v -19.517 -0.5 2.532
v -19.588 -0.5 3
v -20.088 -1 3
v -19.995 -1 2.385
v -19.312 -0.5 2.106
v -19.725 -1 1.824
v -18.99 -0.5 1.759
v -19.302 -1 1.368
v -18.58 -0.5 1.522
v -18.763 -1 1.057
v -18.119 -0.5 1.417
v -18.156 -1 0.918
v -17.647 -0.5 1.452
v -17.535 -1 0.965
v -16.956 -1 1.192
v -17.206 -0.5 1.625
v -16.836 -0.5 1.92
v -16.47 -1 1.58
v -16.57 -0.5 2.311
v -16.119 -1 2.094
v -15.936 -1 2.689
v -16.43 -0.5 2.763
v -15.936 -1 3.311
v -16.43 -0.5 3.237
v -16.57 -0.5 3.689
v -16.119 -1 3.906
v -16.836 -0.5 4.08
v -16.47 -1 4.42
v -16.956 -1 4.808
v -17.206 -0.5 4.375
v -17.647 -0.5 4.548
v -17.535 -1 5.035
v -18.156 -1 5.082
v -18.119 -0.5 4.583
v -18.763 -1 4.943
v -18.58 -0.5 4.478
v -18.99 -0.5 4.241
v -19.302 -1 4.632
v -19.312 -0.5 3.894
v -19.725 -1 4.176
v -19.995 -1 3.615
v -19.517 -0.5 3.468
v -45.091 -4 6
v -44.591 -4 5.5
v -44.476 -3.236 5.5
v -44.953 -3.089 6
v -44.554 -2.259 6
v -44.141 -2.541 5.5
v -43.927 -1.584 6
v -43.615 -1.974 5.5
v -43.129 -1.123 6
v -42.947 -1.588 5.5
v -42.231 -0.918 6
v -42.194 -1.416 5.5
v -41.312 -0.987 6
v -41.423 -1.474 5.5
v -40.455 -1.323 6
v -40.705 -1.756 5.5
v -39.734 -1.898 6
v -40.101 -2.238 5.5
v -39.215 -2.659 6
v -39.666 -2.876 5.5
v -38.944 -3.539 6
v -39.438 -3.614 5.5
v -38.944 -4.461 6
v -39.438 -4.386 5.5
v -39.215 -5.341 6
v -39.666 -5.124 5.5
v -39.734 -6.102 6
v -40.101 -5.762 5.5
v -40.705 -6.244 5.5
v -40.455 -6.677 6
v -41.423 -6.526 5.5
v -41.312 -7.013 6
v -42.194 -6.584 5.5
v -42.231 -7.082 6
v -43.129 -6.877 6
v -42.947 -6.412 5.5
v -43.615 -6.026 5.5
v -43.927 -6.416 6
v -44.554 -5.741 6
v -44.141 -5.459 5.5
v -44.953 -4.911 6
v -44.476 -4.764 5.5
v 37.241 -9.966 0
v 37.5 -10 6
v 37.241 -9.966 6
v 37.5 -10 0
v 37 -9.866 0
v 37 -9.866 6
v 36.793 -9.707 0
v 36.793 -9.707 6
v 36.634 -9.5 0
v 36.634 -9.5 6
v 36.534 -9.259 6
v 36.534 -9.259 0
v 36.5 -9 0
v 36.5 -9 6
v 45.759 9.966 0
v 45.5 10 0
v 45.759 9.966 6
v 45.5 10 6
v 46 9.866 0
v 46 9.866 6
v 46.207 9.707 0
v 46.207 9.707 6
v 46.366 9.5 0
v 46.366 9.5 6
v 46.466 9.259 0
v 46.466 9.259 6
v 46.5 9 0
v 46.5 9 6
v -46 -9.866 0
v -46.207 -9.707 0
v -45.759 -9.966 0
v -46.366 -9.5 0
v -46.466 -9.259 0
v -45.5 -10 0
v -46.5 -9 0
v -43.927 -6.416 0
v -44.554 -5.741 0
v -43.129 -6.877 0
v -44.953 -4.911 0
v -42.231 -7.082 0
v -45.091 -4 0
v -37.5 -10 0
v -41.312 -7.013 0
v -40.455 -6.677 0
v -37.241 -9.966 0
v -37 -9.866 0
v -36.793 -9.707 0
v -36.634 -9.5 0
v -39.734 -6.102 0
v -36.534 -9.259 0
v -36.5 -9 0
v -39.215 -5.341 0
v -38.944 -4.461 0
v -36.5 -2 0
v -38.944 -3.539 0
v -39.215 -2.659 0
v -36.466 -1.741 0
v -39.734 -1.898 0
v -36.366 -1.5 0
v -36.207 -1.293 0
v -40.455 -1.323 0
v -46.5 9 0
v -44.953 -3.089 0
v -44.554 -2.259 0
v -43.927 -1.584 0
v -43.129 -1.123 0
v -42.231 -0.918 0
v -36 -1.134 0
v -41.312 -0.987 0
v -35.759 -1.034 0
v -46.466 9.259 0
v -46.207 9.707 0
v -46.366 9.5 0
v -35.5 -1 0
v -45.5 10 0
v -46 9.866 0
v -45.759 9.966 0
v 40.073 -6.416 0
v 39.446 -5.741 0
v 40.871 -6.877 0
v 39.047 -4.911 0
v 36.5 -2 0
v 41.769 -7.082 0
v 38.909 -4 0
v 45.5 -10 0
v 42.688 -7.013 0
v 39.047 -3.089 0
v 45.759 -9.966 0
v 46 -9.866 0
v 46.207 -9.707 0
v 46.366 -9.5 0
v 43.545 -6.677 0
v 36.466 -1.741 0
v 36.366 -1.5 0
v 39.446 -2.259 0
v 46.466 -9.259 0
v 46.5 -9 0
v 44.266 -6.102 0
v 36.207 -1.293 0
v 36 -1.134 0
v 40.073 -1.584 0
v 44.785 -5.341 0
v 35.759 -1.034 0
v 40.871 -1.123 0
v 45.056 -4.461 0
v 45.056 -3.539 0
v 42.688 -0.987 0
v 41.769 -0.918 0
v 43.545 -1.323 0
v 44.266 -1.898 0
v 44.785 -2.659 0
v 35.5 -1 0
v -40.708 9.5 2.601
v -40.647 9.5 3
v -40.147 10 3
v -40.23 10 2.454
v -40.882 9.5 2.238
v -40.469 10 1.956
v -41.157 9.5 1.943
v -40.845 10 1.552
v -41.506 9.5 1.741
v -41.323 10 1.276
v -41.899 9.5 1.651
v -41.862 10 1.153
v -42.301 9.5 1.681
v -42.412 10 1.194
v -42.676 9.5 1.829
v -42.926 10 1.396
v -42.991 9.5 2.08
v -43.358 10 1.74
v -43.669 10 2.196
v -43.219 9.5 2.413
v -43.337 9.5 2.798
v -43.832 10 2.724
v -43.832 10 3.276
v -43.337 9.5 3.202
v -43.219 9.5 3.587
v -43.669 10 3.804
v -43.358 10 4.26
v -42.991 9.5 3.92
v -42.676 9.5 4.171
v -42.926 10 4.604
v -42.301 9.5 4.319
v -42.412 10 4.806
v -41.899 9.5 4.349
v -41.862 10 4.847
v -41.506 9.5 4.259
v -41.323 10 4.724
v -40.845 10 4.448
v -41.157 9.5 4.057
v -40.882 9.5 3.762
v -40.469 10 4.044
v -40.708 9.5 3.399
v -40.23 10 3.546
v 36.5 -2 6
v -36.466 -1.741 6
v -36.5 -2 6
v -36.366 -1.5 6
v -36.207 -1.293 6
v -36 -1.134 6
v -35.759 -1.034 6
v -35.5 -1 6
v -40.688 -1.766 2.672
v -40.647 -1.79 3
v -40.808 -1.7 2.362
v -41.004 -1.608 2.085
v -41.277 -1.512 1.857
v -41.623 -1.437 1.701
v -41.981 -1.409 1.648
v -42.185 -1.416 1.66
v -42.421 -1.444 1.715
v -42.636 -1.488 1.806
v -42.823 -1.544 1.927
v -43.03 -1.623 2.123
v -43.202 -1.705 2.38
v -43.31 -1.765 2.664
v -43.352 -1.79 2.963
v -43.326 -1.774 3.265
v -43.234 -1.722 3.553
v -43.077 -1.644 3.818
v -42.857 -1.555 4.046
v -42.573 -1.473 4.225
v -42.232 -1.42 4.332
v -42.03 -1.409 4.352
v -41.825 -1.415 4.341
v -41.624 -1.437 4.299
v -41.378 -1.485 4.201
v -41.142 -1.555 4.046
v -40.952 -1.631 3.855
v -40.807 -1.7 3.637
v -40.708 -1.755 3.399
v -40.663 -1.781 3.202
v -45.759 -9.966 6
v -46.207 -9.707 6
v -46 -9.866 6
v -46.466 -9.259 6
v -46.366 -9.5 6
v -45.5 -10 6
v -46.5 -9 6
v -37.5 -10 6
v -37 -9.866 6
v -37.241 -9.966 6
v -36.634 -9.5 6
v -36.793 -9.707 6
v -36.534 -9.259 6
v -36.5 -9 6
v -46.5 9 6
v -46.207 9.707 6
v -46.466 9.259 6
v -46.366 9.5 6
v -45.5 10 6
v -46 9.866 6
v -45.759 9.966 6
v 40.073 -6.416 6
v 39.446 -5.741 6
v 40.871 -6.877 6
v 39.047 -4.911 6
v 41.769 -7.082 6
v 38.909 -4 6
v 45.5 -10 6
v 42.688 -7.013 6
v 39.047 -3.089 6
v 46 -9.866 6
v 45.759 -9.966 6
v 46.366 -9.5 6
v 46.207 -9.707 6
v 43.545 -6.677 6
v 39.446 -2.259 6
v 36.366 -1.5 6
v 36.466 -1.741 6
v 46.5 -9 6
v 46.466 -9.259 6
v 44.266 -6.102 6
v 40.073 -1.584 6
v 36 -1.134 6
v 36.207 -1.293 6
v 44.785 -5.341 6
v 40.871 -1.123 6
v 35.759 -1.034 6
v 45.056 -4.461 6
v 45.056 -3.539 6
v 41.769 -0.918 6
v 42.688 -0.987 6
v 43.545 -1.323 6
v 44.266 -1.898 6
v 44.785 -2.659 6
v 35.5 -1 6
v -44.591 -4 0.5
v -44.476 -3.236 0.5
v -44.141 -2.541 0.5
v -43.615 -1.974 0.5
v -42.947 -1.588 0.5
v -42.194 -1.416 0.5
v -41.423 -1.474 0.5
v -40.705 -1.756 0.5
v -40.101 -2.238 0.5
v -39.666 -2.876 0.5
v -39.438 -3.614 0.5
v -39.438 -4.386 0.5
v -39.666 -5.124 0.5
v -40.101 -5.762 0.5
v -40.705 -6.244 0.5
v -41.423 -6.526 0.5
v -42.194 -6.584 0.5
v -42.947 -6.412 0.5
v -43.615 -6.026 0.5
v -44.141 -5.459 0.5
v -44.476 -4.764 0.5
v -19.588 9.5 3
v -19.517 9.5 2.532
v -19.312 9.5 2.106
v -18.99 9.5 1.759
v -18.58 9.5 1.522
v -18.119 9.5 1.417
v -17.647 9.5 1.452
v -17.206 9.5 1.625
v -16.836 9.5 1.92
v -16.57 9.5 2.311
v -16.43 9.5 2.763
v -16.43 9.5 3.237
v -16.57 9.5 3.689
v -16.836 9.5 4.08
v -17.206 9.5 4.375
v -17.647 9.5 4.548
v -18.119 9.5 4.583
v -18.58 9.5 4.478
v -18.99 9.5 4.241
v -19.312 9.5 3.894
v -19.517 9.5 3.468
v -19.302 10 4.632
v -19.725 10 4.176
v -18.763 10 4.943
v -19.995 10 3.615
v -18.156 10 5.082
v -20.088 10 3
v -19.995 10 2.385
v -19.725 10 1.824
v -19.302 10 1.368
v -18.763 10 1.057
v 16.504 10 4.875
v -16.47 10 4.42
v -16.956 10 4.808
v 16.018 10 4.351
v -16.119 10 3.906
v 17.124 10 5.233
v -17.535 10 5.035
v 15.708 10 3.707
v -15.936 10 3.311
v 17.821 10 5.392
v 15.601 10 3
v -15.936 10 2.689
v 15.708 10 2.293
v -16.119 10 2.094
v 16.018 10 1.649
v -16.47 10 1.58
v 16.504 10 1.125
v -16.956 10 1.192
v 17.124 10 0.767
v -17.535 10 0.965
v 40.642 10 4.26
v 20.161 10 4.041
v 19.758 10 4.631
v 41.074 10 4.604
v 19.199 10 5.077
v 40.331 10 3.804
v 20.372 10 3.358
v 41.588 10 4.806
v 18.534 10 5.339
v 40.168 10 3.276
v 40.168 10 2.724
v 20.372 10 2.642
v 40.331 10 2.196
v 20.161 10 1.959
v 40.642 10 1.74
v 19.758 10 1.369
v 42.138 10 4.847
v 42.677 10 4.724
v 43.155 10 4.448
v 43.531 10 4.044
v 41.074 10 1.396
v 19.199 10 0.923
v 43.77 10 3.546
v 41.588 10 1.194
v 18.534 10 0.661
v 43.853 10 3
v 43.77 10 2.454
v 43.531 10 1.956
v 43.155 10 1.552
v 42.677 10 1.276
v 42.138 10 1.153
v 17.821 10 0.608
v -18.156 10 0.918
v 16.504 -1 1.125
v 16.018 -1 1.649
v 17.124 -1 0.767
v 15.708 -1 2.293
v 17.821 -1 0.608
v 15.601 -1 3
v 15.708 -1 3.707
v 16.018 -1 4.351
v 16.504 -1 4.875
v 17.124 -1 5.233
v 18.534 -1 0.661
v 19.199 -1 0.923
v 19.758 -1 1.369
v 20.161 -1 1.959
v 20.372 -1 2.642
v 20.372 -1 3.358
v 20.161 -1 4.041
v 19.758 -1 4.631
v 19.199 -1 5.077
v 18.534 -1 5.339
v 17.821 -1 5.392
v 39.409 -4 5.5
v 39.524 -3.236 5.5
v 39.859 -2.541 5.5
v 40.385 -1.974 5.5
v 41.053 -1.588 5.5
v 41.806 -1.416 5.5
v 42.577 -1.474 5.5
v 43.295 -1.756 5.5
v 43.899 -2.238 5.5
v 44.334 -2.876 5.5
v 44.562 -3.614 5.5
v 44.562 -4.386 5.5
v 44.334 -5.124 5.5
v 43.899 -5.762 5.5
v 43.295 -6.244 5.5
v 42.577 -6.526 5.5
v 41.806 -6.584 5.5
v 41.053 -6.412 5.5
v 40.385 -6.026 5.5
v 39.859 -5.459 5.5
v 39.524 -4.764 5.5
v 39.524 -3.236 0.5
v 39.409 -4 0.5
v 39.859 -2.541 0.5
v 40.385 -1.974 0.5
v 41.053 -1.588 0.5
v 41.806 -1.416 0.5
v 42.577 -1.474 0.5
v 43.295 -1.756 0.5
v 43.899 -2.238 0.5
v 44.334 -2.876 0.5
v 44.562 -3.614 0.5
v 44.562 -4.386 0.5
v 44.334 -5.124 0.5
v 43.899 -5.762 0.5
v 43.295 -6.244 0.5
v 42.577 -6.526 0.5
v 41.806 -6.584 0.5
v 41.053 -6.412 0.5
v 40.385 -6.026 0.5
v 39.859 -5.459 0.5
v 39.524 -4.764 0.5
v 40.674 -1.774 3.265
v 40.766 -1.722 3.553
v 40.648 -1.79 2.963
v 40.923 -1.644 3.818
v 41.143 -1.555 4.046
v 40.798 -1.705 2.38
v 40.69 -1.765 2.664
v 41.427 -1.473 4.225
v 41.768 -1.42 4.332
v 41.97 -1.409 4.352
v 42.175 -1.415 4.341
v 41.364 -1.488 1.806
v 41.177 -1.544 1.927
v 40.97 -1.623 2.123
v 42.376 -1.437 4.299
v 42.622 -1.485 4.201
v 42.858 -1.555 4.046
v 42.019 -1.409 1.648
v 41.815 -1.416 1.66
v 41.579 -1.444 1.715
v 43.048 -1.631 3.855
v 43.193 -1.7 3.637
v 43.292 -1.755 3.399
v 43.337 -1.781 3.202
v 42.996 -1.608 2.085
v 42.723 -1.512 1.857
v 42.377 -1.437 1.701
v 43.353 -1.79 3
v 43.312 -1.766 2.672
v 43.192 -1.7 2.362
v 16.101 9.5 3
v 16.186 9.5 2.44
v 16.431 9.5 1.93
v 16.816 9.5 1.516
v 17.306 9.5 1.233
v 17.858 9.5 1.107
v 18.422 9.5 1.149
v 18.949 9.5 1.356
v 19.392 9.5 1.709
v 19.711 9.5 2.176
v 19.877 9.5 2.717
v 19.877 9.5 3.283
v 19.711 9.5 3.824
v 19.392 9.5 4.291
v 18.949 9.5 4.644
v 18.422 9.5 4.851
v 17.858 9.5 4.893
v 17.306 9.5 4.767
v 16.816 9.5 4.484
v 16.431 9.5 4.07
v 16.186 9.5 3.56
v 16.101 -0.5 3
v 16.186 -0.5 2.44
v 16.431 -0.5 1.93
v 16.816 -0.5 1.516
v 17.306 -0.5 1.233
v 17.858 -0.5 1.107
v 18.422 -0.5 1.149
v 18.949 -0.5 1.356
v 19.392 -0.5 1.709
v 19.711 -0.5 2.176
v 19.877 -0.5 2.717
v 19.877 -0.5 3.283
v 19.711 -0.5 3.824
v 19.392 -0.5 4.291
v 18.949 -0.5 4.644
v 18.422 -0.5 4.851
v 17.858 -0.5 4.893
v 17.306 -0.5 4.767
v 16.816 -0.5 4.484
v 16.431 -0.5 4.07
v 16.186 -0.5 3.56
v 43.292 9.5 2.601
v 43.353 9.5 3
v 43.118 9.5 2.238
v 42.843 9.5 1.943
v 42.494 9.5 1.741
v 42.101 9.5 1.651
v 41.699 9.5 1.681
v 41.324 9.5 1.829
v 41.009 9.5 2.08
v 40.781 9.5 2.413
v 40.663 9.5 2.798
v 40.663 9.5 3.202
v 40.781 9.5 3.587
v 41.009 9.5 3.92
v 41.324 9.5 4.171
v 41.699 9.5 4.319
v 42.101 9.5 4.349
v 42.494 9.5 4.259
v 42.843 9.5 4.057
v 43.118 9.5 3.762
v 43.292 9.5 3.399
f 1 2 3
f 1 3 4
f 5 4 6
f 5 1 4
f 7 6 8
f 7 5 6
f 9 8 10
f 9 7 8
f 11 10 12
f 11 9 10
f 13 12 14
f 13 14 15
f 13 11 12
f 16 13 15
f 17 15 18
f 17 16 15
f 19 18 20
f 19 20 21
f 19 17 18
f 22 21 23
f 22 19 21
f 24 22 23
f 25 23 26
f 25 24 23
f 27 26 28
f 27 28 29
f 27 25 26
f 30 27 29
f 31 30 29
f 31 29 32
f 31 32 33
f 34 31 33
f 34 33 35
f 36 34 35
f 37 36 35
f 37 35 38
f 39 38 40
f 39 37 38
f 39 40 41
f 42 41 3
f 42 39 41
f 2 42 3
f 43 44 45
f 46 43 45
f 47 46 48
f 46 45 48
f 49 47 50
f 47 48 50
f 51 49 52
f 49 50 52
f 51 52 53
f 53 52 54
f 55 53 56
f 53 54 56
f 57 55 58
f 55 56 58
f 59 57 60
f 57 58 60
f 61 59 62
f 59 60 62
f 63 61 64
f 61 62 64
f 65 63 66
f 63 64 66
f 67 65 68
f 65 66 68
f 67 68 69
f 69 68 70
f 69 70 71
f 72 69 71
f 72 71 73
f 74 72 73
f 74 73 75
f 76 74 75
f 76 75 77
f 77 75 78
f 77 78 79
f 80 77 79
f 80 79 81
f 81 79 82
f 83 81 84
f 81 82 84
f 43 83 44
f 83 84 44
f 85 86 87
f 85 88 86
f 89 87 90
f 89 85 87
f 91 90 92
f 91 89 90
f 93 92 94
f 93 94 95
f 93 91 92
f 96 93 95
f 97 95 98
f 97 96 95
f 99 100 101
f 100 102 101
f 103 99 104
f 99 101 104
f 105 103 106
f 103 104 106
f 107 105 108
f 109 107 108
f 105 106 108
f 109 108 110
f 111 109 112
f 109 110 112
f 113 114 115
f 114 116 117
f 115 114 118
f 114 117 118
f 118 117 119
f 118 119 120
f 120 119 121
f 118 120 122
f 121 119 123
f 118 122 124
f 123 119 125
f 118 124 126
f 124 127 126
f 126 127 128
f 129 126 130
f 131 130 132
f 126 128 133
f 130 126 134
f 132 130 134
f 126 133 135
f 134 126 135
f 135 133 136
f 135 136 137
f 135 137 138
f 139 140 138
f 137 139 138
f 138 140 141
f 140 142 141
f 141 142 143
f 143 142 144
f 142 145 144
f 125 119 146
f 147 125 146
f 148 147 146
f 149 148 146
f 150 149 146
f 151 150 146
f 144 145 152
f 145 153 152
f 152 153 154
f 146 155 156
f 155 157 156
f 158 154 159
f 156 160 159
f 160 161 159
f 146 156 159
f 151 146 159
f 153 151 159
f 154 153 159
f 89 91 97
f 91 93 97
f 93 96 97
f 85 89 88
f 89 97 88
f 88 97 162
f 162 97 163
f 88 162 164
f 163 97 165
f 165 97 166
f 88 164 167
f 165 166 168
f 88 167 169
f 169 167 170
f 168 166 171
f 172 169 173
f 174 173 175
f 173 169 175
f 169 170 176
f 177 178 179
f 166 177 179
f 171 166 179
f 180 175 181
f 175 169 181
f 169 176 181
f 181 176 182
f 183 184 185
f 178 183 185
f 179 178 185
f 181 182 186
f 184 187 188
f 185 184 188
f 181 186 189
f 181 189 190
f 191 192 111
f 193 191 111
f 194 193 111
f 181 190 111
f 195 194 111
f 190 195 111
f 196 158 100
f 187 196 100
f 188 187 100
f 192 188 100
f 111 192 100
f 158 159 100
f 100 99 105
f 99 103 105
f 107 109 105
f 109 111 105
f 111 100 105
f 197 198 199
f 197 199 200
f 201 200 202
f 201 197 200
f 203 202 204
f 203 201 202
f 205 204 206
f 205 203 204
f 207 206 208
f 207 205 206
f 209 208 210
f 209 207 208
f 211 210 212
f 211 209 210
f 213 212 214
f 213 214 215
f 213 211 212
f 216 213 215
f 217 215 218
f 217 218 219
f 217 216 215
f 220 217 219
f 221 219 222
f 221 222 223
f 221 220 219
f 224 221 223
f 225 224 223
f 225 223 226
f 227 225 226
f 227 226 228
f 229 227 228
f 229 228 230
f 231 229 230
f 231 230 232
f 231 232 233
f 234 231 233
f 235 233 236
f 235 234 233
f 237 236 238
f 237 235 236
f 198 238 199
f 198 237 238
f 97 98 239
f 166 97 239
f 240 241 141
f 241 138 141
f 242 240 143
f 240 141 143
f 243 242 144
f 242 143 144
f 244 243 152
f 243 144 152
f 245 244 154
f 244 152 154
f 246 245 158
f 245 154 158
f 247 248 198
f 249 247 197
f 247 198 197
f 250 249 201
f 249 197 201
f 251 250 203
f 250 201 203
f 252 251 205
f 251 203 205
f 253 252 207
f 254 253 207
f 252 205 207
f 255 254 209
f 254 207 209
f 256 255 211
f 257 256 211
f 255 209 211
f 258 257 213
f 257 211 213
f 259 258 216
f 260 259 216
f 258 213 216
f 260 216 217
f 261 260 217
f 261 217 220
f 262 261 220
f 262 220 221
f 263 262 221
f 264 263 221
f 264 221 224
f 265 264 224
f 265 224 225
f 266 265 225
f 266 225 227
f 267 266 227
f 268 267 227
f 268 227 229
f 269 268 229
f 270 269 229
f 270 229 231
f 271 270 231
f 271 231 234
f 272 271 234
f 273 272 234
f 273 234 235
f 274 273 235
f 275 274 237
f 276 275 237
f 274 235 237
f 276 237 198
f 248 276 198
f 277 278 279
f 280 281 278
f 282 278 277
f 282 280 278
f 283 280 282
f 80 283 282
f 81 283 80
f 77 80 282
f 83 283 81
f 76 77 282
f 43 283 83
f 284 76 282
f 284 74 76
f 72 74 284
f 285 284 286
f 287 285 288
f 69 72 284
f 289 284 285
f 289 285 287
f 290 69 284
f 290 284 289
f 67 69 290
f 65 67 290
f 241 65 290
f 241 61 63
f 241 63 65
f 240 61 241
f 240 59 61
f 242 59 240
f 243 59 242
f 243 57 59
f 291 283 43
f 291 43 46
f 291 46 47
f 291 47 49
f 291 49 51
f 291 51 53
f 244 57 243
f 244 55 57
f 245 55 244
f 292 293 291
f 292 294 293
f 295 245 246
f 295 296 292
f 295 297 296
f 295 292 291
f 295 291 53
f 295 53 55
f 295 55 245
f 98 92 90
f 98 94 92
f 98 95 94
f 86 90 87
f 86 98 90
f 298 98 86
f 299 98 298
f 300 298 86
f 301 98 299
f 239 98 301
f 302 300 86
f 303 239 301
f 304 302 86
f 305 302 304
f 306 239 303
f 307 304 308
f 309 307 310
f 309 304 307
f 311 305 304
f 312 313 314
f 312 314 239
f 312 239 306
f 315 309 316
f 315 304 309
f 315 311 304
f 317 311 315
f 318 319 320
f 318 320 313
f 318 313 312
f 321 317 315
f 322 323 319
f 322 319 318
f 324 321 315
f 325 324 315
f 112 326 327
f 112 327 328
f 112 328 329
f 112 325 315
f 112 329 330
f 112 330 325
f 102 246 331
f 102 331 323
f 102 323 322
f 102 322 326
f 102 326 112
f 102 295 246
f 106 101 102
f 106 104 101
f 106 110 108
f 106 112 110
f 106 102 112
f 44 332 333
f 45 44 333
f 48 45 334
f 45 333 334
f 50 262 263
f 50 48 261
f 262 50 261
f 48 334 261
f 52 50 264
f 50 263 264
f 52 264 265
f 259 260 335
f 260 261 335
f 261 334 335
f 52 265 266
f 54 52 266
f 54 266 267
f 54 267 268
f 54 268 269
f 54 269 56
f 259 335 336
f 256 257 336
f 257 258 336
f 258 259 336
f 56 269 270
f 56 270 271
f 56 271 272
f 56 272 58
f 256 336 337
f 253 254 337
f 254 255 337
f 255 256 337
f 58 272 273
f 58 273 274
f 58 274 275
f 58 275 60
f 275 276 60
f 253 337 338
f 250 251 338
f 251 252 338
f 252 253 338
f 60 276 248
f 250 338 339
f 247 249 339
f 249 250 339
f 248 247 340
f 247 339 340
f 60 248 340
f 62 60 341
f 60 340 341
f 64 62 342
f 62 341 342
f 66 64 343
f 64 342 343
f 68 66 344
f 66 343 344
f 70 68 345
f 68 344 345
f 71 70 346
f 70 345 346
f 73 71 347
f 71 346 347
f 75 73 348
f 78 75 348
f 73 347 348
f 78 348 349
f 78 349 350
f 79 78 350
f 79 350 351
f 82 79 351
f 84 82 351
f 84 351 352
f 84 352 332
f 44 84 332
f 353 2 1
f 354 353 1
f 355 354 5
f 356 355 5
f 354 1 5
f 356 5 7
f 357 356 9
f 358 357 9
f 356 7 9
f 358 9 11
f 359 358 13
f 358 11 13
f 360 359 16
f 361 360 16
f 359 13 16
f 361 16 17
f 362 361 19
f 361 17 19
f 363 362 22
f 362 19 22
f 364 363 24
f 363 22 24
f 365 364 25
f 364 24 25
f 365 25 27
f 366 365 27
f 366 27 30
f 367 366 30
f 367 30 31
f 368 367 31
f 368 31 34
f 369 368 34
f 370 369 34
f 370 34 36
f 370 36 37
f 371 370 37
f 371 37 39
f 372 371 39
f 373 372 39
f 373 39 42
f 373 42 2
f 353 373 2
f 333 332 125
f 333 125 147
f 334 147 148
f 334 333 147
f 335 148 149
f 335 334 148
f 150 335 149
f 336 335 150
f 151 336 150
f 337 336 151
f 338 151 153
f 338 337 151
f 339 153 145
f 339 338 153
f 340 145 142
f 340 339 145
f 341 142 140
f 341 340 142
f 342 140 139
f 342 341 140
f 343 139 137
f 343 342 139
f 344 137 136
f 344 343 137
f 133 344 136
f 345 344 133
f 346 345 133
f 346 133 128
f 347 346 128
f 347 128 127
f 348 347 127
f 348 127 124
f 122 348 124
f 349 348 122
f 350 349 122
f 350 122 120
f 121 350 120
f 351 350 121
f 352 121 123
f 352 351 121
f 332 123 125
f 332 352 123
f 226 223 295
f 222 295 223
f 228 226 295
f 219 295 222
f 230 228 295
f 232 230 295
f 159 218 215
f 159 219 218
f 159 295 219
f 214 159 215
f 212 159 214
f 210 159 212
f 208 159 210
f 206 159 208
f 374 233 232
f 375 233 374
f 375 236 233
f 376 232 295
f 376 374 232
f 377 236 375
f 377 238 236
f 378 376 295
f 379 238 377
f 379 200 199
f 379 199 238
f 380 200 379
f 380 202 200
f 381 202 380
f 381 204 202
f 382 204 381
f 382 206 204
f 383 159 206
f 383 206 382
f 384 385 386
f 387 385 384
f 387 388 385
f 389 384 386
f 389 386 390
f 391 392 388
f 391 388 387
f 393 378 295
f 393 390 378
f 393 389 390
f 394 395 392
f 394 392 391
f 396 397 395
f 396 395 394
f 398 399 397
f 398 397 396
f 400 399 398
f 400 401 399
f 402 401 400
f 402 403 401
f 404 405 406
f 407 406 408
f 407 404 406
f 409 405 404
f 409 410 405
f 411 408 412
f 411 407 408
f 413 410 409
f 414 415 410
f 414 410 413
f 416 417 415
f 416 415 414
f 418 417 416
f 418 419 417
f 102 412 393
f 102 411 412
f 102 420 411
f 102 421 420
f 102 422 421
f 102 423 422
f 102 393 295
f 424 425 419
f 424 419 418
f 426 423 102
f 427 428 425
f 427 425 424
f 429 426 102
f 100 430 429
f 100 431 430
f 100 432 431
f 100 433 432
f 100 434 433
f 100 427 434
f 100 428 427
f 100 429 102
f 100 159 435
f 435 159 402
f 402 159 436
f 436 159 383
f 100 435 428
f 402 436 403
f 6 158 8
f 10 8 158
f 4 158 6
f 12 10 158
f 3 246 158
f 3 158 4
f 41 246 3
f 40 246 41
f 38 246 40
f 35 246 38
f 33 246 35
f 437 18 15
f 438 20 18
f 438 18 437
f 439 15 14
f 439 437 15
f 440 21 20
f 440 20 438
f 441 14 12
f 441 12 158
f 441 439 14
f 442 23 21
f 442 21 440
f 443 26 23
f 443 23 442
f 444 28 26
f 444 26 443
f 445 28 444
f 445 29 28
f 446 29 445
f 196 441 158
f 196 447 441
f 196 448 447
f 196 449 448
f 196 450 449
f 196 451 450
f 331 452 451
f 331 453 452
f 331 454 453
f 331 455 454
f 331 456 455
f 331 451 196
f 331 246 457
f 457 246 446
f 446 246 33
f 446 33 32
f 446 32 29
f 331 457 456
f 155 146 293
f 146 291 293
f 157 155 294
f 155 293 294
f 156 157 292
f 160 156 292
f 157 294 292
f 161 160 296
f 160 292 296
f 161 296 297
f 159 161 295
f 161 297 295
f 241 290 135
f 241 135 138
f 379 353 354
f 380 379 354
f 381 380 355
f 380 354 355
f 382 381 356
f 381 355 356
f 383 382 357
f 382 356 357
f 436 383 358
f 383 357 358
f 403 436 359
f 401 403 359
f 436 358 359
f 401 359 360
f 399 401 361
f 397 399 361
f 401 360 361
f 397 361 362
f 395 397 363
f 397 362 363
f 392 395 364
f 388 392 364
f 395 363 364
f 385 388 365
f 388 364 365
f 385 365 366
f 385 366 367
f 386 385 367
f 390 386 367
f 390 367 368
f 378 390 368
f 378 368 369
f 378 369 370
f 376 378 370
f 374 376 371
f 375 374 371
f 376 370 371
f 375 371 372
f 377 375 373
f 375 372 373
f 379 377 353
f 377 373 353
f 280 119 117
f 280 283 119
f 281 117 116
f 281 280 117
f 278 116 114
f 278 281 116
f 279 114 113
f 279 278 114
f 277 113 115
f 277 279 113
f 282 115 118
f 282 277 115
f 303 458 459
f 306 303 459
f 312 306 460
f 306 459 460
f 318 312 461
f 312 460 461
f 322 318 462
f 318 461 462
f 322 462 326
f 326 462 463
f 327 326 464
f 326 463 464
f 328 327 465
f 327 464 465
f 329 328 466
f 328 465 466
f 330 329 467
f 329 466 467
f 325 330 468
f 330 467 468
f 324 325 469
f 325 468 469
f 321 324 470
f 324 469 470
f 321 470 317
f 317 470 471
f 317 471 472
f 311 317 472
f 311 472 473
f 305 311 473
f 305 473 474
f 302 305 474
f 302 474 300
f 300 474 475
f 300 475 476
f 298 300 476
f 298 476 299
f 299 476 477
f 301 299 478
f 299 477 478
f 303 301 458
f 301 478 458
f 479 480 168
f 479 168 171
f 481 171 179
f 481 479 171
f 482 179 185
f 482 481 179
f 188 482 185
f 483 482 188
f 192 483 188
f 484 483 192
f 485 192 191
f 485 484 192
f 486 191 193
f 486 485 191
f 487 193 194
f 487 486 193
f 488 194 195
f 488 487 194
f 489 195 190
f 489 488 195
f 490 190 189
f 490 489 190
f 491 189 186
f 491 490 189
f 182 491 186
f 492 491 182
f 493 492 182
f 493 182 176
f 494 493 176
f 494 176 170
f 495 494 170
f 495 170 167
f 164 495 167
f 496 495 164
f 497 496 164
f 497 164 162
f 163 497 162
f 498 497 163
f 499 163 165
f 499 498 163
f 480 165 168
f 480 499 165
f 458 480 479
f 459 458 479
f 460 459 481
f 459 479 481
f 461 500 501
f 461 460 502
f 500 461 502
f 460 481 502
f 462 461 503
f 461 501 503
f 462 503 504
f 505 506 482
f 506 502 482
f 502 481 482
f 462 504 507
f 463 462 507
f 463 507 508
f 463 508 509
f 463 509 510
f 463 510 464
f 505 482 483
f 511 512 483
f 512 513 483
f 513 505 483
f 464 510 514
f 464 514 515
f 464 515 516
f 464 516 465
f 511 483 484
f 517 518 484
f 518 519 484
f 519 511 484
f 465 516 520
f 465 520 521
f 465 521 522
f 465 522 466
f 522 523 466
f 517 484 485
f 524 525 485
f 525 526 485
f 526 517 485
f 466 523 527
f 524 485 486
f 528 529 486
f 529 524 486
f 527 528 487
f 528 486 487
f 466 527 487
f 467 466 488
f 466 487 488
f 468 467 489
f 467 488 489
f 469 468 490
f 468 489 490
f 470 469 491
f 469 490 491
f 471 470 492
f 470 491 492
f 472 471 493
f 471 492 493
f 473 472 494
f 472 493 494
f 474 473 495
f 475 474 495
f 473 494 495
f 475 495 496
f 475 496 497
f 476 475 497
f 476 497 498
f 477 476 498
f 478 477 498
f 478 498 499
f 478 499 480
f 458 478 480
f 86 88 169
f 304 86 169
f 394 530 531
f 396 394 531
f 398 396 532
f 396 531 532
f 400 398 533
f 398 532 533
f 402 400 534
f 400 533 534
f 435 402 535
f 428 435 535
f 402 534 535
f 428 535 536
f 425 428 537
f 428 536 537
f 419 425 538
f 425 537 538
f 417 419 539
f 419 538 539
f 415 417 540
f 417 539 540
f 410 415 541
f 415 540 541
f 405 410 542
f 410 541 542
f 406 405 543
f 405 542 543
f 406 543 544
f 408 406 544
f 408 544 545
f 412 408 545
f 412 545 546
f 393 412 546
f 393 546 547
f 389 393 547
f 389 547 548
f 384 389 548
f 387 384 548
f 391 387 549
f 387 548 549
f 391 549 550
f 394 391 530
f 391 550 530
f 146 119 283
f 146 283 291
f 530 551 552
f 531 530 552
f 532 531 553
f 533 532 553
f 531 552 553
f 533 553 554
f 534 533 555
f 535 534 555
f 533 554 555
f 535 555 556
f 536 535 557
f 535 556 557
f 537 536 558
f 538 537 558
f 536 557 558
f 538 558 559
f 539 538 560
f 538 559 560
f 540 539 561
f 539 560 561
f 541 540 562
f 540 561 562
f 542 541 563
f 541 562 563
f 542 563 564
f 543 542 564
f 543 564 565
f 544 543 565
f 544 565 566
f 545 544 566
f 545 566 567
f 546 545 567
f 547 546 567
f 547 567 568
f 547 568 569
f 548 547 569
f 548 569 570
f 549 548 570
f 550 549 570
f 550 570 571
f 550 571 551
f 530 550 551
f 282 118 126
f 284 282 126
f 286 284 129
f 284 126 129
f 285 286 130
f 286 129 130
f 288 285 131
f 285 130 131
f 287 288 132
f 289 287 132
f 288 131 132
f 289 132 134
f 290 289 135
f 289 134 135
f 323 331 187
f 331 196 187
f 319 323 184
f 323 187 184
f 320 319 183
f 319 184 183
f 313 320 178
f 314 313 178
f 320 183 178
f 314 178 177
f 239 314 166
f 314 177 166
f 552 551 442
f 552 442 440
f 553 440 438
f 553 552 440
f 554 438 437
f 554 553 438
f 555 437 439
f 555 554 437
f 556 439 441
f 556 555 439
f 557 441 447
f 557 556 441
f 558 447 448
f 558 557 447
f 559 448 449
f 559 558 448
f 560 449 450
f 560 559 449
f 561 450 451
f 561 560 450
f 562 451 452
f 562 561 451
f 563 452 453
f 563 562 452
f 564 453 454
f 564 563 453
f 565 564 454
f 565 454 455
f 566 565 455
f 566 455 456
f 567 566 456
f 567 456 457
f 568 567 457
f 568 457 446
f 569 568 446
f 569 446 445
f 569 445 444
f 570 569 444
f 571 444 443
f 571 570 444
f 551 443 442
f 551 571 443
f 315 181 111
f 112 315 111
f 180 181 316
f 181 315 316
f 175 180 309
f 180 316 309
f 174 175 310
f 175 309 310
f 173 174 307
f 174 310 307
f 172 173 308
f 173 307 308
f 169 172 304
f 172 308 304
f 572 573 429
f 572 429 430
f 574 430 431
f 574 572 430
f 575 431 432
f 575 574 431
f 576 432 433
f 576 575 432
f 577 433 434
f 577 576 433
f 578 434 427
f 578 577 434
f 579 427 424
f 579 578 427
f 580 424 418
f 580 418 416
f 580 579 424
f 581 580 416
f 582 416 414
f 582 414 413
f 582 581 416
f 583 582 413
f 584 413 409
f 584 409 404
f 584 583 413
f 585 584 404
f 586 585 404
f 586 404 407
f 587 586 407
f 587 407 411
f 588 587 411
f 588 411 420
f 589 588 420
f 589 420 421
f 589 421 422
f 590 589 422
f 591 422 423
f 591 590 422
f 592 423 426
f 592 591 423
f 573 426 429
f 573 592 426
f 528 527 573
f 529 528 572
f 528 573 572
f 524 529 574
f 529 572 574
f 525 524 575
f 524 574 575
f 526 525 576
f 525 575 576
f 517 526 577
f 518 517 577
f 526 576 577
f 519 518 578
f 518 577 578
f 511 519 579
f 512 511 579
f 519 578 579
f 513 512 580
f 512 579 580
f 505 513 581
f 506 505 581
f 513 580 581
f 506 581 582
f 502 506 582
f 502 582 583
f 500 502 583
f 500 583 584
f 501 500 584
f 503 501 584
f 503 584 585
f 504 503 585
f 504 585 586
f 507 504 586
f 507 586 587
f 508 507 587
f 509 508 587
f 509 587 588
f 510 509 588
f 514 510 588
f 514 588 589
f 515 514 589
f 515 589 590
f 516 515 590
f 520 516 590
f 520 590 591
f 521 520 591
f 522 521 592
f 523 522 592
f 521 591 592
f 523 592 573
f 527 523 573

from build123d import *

# Parameters (mm, degrees)
SKETCH1_W                    = 93
SKETCH1_H                    = 20
BOSS_EXTRUDE1_DEPTH          = 6
CUT_EXTRUDE1_REACH           = 49.94
SKETCH2_W                    = 73
SKETCH2_H                    = 9
F_6_0_204_DIAMETER_HOLE1_D   = 5.1816
F_6_CLEARANCE_HOLE1_D        = 3.7973
F_6_32_TAPPED_HOLE1_REACH    = 52.973
F_6_32_TAPPED_HOLE1_BORE_R   = 1.35255
F_1_8_0_125_DIAMETER_HOLE1_D = 3.175
FILLET1_R                    = 1
CHAMFER1_SIZE                = 0.5


with BuildPart() as part:
    # Sketch1 → Boss-Extrude1 (new body)
    with BuildSketch(Plane.XY):
        Rectangle(SKETCH1_W, SKETCH1_H)
    extrude(amount=BOSS_EXTRUDE1_DEPTH)

    # Sketch2 → Cut-Extrude1 (cut, up to next)
    with BuildSketch(Plane.XY.offset(6), mode=Mode.PRIVATE) as cut_extrude1_sk1:
        with Locations((0, -5.5)):
            Rectangle(SKETCH2_W, SKETCH2_H)
    cut_extrude1_tool1 = extrude(cut_extrude1_sk1.sketch, amount=-CUT_EXTRUDE1_REACH, mode=Mode.PRIVATE) & part.part
    add(cut_extrude1_tool1.solids().sort_by_distance((0, -5.5, 6))[0], mode=Mode.SUBTRACT)

    # #6 (0.204) Diameter Hole1 (through all)
    with Locations(Plane.XY.offset(6)):
        with Locations((42, -4), (-42, -4)):
            Hole(F_6_0_204_DIAMETER_HOLE1_D / 2)

    # #6 Clearance Hole1 (through all)
    with Locations(Plane(origin=(0, 10, 0), x_dir=(1, 0, 0), z_dir=(0, 1, 0))):
        with Locations((18, -3)):
            Hole(F_6_CLEARANCE_HOLE1_D / 2)

    # #6-32 Tapped Hole1 bore → #6-32 Tapped Hole1 (cut, up to next)
    with BuildSketch(Plane(origin=(0, 10, 0), x_dir=(1, 0, 0), z_dir=(0, 1, 0)), mode=Mode.PRIVATE) as f_6_32_tapped_hole1_sk1:
        with Locations((-42, -3)):
            Circle(F_6_32_TAPPED_HOLE1_BORE_R)
    f_6_32_tapped_hole1_tool1 = extrude(f_6_32_tapped_hole1_sk1.sketch, amount=-F_6_32_TAPPED_HOLE1_REACH, mode=Mode.PRIVATE) & part.part
    # #6-32 Tapped Hole1 bore → #6-32 Tapped Hole1 (cut, up to next)
    with BuildSketch(Plane(origin=(0, 10, 0), x_dir=(1, 0, 0), z_dir=(0, 1, 0)), mode=Mode.PRIVATE) as f_6_32_tapped_hole1_sk2:
        with Locations((42, -3)):
            Circle(F_6_32_TAPPED_HOLE1_BORE_R)
    f_6_32_tapped_hole1_tool2 = extrude(f_6_32_tapped_hole1_sk2.sketch, amount=-F_6_32_TAPPED_HOLE1_REACH, mode=Mode.PRIVATE) & part.part
    add(f_6_32_tapped_hole1_tool1.solids().sort_by_distance((-42, 10, 3))[0], mode=Mode.SUBTRACT)
    add(f_6_32_tapped_hole1_tool2.solids().sort_by_distance((42, 10, 3))[0], mode=Mode.SUBTRACT)

    # 1/8 (0.125) Diameter Hole1 (through all)
    with Locations(Plane(origin=(0, 10, 0), x_dir=(1, 0, 0), z_dir=(0, 1, 0))):
        with Locations((-18, -3)):
            Hole(F_1_8_0_125_DIAMETER_HOLE1_D / 2)

    # Fillet1
    fillet1_edges = [part.edges().sort_by_distance(p)[0] for p in [
        (-36.5, -10, 3),
        (-36.5, -1, 3),
        (36.5, -1, 3),
        (36.5, -10, 3),
        (46.5, -10, 3),
        (-46.5, -10, 3),
        (-46.5, 10, 3),
        (46.5, 10, 3),
    ]]
    fillet(fillet1_edges, radius=FILLET1_R)

    # Chamfer1
    chamfer1_edges = [part.edges().sort_by_distance(p)[0] for p in [
        (44.5908, -4, 6),
        (44.5908, -4, 0),
        (-39.4092, -4, 6),
        (-39.4092, -4, 0),
        (19.89865, 10, 3),
        (19.89865, -1, 3),
        (40.64745, 10, 3),
        (-43.35255, 10, 3),
        (-16.4125, 10, 3),
        (-16.4125, -1, 3),
    ]]
    chamfer(chamfer1_edges, length=CHAMFER1_SIZE)


solid = part.part
